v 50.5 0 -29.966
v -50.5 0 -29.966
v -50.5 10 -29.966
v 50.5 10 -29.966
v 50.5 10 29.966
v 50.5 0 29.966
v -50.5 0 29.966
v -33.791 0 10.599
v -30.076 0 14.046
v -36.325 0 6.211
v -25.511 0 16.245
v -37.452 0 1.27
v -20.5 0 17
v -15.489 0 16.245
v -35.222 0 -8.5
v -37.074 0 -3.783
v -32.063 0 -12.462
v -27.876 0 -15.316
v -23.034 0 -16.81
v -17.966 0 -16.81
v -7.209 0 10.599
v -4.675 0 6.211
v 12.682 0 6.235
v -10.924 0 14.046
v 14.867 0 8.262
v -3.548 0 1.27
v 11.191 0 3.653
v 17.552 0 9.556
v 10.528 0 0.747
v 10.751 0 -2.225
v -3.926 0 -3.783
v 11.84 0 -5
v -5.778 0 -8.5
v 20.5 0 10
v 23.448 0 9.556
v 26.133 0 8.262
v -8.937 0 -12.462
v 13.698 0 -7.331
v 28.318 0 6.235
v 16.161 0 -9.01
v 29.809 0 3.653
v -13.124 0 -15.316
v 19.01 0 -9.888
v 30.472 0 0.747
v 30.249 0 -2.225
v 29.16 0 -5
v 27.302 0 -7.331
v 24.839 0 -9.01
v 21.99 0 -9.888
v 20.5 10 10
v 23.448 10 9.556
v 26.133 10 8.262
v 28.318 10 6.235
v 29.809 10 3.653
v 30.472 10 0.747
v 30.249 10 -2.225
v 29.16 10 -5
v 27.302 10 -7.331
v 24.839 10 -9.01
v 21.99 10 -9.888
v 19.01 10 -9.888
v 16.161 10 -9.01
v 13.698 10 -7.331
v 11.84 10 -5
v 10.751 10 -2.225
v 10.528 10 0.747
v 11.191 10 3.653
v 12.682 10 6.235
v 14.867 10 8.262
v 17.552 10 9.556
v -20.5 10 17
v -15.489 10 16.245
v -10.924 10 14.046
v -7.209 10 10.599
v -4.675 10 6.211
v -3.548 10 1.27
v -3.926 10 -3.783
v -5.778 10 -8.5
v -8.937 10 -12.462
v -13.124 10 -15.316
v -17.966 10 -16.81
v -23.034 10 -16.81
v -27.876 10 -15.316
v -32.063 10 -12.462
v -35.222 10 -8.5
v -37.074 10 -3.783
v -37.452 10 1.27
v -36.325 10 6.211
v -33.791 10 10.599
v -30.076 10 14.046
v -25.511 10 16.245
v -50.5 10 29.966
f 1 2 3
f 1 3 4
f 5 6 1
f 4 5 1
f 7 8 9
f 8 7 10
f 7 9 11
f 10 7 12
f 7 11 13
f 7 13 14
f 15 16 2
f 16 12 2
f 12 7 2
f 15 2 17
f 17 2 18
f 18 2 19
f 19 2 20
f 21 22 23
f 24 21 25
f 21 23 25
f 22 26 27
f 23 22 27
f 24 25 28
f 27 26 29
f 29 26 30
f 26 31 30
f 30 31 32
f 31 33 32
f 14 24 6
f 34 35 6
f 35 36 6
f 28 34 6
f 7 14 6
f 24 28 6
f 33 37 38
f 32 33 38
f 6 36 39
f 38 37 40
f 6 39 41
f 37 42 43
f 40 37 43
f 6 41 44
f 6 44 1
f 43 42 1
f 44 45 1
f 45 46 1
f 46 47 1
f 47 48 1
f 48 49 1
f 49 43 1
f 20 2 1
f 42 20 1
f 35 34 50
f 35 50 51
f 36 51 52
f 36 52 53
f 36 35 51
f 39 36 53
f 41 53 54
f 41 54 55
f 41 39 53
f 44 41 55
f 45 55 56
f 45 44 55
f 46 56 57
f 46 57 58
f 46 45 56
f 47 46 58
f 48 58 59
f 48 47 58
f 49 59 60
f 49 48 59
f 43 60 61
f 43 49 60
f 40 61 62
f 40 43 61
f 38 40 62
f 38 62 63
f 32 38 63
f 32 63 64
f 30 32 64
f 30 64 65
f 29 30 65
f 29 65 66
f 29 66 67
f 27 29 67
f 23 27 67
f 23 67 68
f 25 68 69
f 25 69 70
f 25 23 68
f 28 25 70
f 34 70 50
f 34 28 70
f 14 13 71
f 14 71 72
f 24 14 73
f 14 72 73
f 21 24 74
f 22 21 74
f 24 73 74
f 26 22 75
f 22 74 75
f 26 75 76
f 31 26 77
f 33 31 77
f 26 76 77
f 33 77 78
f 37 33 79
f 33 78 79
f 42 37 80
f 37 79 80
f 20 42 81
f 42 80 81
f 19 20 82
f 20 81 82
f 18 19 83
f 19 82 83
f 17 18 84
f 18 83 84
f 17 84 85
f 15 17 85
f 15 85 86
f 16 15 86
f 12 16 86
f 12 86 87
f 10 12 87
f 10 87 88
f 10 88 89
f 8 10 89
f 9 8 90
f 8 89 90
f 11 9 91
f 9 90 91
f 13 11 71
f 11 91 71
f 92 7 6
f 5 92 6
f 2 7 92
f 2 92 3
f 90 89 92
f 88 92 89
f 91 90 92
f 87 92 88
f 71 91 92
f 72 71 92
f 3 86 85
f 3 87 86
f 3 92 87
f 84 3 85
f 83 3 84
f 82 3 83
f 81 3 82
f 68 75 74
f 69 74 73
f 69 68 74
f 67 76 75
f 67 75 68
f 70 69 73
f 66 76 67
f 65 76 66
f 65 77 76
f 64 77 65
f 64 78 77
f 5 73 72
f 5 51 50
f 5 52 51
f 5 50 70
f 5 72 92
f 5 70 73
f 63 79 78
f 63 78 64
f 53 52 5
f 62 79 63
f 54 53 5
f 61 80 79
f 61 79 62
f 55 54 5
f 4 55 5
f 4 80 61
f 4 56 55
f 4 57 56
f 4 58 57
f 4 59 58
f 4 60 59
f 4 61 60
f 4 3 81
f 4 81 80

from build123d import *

# Parameters (mm, degrees)
SKETCH1_W           = 101
SKETCH1_H           = 59.932047928
SKETCH1_R           = 11
SKETCH1_R_2         = 10
BOSS_EXTRUDE1_DEPTH = 10
SKETCH2_R           = 17
CUT_EXTRUDE1_DEPTH  = 10


with BuildPart() as part:
    # Sketch1 → Boss-Extrude1 (new body)
    with BuildSketch(Plane(origin=(0, 0, 0), x_dir=(1, 0, 0), z_dir=(0, 1, 0))):
        Rectangle(SKETCH1_W, SKETCH1_H)
        with Locations(Location((-20.5, 0, 0), (0, 0, 270))):
            Circle(SKETCH1_R, mode=Mode.SUBTRACT)
        with Locations(Location((20.5, 0, 0), (0, 0, 270))):
            Circle(SKETCH1_R_2, mode=Mode.SUBTRACT)
    extrude(amount=BOSS_EXTRUDE1_DEPTH)

    # Sketch2 → Cut-Extrude1 (cut)
    with BuildSketch(Plane(origin=(0, 10, 0), x_dir=(1, 0, 0), z_dir=(0, 1, 0))):
        with Locations(Location((-20.5, 0, 0), (0, 0, 270))):
            Circle(SKETCH2_R)
    extrude(amount=-CUT_EXTRUDE1_DEPTH, mode=Mode.SUBTRACT)


solid = part.part
